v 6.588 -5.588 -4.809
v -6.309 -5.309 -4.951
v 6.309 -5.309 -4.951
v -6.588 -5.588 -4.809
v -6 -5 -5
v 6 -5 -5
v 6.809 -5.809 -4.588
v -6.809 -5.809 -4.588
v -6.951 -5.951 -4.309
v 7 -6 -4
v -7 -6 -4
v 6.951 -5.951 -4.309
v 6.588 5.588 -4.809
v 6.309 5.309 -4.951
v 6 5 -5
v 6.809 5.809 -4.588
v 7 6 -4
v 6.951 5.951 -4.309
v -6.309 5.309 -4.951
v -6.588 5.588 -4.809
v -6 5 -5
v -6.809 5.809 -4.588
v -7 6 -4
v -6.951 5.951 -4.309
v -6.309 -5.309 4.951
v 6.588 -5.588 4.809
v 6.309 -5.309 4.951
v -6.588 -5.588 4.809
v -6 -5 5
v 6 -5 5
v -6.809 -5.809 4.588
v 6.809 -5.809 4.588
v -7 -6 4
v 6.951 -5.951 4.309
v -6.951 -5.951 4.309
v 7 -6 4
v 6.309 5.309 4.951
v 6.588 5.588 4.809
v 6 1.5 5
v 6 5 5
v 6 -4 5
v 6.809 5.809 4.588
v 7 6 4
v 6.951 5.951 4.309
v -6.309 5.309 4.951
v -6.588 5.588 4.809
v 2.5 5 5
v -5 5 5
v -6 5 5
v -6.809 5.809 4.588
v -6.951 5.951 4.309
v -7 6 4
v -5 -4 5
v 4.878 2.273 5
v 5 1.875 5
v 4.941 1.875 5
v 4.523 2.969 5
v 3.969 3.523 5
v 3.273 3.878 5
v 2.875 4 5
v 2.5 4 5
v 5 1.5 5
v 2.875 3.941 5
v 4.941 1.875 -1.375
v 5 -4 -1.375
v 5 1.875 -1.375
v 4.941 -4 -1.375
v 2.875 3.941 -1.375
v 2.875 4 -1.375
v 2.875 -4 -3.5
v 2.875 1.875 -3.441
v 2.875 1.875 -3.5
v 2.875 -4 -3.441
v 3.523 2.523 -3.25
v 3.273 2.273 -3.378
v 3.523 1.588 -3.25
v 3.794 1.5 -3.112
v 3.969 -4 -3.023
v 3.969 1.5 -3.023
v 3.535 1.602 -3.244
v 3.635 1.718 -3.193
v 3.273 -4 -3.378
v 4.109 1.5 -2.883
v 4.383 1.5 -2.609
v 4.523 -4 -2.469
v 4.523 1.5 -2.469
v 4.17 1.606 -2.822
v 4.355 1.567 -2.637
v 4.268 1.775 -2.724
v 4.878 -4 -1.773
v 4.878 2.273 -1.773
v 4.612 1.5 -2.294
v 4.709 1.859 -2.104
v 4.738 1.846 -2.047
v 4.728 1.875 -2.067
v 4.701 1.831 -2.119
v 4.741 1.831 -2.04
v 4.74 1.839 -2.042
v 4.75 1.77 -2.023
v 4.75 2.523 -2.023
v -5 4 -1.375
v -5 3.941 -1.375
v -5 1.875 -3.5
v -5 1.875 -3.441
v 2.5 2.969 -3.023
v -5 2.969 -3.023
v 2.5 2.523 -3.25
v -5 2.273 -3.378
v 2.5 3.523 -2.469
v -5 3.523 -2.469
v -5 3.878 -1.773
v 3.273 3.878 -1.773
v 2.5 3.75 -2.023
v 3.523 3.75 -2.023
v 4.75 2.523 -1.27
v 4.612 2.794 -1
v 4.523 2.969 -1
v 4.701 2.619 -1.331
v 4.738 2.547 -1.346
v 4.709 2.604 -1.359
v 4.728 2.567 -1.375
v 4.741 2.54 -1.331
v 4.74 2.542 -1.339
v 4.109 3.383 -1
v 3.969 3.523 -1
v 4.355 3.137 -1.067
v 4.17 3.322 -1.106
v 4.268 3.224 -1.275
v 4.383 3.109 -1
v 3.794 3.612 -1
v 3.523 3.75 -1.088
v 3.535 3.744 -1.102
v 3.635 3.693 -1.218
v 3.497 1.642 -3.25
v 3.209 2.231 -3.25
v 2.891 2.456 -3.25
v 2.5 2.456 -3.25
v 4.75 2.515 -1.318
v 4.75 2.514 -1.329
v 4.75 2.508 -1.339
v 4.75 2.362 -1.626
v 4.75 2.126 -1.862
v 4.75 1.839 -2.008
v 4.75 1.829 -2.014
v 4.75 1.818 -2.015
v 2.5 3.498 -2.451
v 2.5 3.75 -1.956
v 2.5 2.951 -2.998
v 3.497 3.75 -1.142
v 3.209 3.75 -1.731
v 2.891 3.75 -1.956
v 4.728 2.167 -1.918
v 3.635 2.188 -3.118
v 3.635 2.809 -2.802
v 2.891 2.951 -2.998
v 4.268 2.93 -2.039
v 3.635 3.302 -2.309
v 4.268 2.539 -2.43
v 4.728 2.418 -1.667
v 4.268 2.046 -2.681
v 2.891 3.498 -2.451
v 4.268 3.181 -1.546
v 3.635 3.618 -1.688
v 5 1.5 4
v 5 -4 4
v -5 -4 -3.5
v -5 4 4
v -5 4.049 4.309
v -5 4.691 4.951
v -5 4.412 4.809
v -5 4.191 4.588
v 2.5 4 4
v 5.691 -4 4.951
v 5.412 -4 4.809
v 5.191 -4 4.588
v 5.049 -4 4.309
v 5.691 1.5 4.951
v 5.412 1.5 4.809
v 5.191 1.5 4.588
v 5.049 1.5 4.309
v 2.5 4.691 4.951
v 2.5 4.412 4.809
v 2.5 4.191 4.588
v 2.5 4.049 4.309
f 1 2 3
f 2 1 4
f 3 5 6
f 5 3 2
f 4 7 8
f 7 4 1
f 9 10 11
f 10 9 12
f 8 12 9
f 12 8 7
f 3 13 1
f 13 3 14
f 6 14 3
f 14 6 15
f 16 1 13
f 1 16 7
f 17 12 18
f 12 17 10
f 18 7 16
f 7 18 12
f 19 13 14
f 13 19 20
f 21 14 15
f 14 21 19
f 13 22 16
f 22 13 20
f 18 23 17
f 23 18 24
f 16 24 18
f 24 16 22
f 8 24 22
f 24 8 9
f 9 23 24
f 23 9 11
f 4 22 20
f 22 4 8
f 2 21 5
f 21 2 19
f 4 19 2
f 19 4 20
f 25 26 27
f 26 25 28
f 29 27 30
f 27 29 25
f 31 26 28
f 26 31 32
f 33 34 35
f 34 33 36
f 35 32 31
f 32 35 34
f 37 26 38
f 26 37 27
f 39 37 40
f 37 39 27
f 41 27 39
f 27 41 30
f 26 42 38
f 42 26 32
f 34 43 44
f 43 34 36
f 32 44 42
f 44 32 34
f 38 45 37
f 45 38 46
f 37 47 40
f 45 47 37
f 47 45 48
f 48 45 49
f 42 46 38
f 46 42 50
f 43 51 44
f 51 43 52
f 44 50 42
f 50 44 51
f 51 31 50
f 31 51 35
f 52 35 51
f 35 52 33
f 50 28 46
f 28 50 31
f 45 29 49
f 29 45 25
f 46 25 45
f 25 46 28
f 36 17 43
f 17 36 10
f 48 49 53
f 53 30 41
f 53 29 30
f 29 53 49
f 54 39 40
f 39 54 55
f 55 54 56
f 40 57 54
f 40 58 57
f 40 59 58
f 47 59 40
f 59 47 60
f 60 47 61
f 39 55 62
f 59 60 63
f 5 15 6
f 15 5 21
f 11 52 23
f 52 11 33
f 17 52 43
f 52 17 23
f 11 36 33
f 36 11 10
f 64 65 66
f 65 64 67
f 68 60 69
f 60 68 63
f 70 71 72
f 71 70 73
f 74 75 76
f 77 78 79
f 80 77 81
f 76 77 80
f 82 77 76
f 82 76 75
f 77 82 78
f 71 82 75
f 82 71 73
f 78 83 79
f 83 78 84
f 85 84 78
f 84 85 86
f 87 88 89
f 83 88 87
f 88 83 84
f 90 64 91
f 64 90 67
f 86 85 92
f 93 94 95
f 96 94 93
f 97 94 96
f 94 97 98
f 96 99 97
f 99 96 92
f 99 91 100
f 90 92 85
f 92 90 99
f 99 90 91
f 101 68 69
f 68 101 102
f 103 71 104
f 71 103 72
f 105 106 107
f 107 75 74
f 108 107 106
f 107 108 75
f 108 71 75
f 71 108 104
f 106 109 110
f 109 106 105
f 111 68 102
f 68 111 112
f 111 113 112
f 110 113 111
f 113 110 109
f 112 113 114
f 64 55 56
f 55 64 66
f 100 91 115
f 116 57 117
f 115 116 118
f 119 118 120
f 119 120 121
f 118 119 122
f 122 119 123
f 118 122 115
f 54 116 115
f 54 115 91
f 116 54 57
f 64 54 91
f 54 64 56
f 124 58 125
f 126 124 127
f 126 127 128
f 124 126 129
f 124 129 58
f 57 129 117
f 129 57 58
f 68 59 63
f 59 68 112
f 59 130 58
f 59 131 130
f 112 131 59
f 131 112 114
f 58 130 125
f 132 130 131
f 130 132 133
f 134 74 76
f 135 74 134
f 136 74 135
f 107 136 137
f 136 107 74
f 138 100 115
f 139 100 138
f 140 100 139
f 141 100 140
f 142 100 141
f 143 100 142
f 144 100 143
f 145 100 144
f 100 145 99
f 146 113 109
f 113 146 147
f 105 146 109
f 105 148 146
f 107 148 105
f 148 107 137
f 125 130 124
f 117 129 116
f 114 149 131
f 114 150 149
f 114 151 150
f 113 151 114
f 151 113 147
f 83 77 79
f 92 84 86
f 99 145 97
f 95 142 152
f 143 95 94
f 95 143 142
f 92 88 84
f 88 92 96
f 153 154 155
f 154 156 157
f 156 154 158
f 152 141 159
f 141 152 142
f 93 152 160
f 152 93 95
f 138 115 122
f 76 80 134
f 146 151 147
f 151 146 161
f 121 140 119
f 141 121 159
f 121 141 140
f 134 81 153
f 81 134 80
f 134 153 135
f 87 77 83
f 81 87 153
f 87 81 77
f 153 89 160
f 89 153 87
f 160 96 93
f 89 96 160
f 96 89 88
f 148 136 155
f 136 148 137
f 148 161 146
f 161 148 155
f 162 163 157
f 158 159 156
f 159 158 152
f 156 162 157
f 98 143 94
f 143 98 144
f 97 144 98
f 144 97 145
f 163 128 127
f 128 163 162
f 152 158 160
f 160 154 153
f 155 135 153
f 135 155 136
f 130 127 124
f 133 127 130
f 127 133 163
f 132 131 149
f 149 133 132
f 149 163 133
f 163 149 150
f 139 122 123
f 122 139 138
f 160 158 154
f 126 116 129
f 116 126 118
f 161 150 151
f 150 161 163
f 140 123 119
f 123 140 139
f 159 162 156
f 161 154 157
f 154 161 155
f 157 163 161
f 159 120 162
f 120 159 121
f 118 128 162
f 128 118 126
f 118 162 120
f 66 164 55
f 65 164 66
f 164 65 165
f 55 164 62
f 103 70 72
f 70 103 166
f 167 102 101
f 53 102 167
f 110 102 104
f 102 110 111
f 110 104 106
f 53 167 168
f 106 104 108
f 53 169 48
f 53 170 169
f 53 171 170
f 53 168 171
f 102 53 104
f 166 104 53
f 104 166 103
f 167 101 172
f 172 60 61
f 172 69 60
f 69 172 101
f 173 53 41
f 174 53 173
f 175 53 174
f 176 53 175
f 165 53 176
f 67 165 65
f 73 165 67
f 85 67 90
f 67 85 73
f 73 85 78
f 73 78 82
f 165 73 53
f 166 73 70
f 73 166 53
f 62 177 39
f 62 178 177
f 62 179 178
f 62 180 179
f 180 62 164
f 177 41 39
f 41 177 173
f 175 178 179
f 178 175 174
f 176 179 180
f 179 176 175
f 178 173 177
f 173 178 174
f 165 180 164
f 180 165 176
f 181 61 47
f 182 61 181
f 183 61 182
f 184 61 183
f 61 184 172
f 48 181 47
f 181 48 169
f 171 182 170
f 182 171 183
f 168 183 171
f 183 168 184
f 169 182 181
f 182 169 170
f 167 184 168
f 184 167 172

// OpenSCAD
$fn=20;

module rcube(size=[1,1,1], center=false, radius=1, debug=false,
		bo, ce, to,
		fr, ri, ba, le,
		bf, br, bb, bl,
		cfl, cfr, cbr, cbl,
		tf, tr, tb, tl) {
		
	// define all values
	bo = bo == undef ? true : bo;
	ce = ce == undef ? true : ce;
	to = to == undef ? true : to;
	
	fr = fr == undef ? true : fr;
	ri = ri == undef ? true : ri;
	ba = ba == undef ? true : ba;
	le = le == undef ? true : le;
	
	bf = bf == undef ? (bo && fr) : bf;
	br = br == undef ? (bo && ri) : br;
	bb = bb == undef ? (bo && ba) : bb;
	bl = bl == undef ? (bo && le) : bl;
	cfl = cfl == undef ? (ce && fr && le) : cfl;
	cfr = cfr == undef ? (ce && fr && ri) : cfr;
	cbr = cbr == undef ? (ce && ba && ri) : cbr;
	cbl = cbl == undef ? (ce && ba && le) : cbl;
	tf = tf == undef ? (to && fr) : tf;
	tr = tr == undef ? (to && ri) : tr;
	tb = tb == undef ? (to && ba) : tb;
	tl = tl == undef ? (to && le) : tl;
	
	module roundEdge(length, translation=[0,0,0], rotation=[0,0,0]) {
		translate(translation) {
			rotate(rotation) {
				difference() {
					translate([(radius)/2 + 1/4,(radius)/2 + 1/4,0]) {
						cube([radius/2 + 1, radius/2 + 1, length + 4], center=true);
					}
					cylinder(h=length + 2, r=radius, center=true);
				}
			}
		}
	}
	module roundFullCorner(translation=[0,0,0], rotation=[0,0,0]) {
		translate(translation) {
			rotate(rotation) {
				difference() {
					cube([radius/2 + 1, radius/2 + 1, radius/2 + 1]);
					sphere(r=radius);
				}
			}
		}			
	}
	
	if(debug) {
		cube(size=size, center=center);
	} else {
	
		translation = center ? [0,0,0] : size / 2;
	
		translate(translation) {
	
			difference() {
				cube(size=size, center=true);
		
				union() {
					x = size[0];
					y = size[1];
					z = size[2];
			
					// edges
					if(bf) {
						roundEdge(x,[0,-y/2 + radius,-z/2 + radius],[180,90,0]);
					}
					if(br) {
						roundEdge(y,[x/2 - radius,0,-z/2 + radius],[90,90,0]);
					}
					if(bb) {
						roundEdge(x,[0,y/2 - radius,-z/2 + radius],[0,90,0]);
					}
					if(bl) {
						roundEdge(y,[-x/2 + radius,0,-z/2 + radius],[90,180,0]);
					}
					if(cfl) {
						roundEdge(z,[-x/2 + radius,-y/2 + radius,0],[0,0,180]);
					}
					if(cfr) {
						roundEdge(z,[x/2 - radius,-y/2 + radius,0],[0,0,270]);
					}
					if(cbl) {
						roundEdge(z,[-x/2 + radius,y/2 - radius,0],[0,0,90]);
					}
					if(cbr) {
						roundEdge(z,[x/2 - radius,y/2 - radius,0],[0,0,0]);
					}
					if(bf) {
						roundEdge(x,[0,-y/2 + radius,-z/2 + radius],[180,90,0]);
					}
					if(tf) {
						roundEdge(x,[0,-y/2 + radius,z/2 - radius],[180,270,0]);
					}
					if(tr) {
						roundEdge(y,[x/2 - radius,0,z/2 - radius],[270,270,0]);
					}
					if(tb) {
						roundEdge(x,[0,y/2 - radius,z/2 - radius],[0,270,0]);
					}
					if(tl) {
						roundEdge(y,[-x/2 + radius,0,z/2 - radius],[270,180,0]);
					}

					// corners
					if(bf && bl && cfl) {
						roundFullCorner([-x/2 + radius,-y/2 + radius,-z/2 + radius], [180,90,0]);
					}
					if(bf && br && cfr) {
						roundFullCorner([x/2 - radius,-y/2 + radius,-z/2 + radius], [180,0,0]);
					}
					if(bb && br && cbr) {
						roundFullCorner([x/2 - radius,y/2 - radius,-z/2 + radius], [0,90,0]);
					}
					if(bb && bl && cbl) {
						roundFullCorner([-x/2 + radius,y/2 - radius,-z/2 + radius], [0,180,0]);
					}
					if(tf && tl && cfl) {
						roundFullCorner([-x/2 + radius,-y/2 + radius,z/2 - radius], [0,0,180]);
					}
					if(tf && tr && cfr) {
						roundFullCorner([x/2 - radius,-y/2 + radius,z/2 - radius], [0,0,270]);
					}
					if(tb && tr && cbr) {
						roundFullCorner([x/2 - radius,y/2 - radius,z/2 - radius], [0,0,0]);
					}
					if(tb && tl && cbl) {
						roundFullCorner([-x/2 + radius,y/2 - radius,z/2 - radius], [0,0,90]);
					}
				}
			}
		}
	}
}

module rInnerTopCube(size=[1,1,1], center=false, radius=1, radius1, radius2, debug=false,
		f=true, r=true, b=true, l=true, convexity=10, $fn=$fn) {

	// define radius1 and radius2
	radius1 = radius1 == undef ? radius : radius1;
	radius2 = radius2 == undef ? radius : radius2;

	module roundEdge(length, translation=[0,0,0], rotation=[0,0,0]) {
		translate(translation) {
			rotate(rotation) {
				difference() {
					translate([-1/2,0,0]) {
						cube([radius1 + 1, 2*radius1, length], center=true);
					}
					translate([radius1/2,-radius1,0]) {
						cylinder(h=length, r=radius1, center=true);
					}
				}
			}
		}
	}
	module roundCorner1(translation=[0,0,0], rotation=[0,0,0]) {
		translate(translation) {
			rotate(rotation) {
				if (radius1 > radius2) {
					difference() {
						cube([2*radius1 + 1,2*radius1 + 1,radius1 + 1]);
						union() {
							translate([0,-1,0]) {
								rotate([270,0,0]) {
									cylinder(h=2*radius1 + 3, r=radius1);
								}
							}
							translate([-1,0,0]) {
								rotate([0,90,0]) {
									cylinder(h=2*radius1 + 3, r=radius1);
								}
							}
						}
					}
				}
			}
		}
	}
	module roundCorner2(translation=[0,0,0], rotation=[0,0,0]) {
		if (radius2 > 0) {
			translate(translation) {
				rotate(rotation) {
					intersection() {
						translate([-radius1-radius2,-radius1-radius2,0]) {
							cube([radius1+radius2+1,radius1+radius2+1,radius2 + 1]);
						}
						difference() {
							translate([0,0,-1]) {
								cylinder(h=radius2 + 3, r=radius1+radius2);
							}
							rotate_extrude(convexity=convexity) {
								translate([radius1+radius2,0,0]) {
									circle(r=radius1, $fn=$fn);
								}
							}
						}
					}
				}
			}
		}
	}
	
	function pos1(pos) = pos > 0 ? pos + radius1 : pos - radius1;
	function pos2(pos) = pos > 0 ? pos - radius2 : pos + radius2;

	module roundCorner(translation=[0,0,0], rotation=[0,0,0]) {
		intersection() {
			roundCorner1([pos1(translation[0]), pos1(translation[1]), translation[2]], rotation);
			roundCorner2([pos2(translation[0]), pos2(translation[1]), translation[2]], rotation);
		}
	}

	function rFR() = (f && r == true) ? true : false;
	function rRB() = (r && b == true) ? true : false;
	function rBL() = (b && l == true) ? true : false;
	function rLF() = (l && f == true) ? true : false;
	
	function longerRadius() = radius1 > radius2 ? radius1 : radius2;
	
	function edgeLength(length, c1, c2) = (c1 == true) ? ((c2 == true) ? length - 2*longerRadius() : length - longerRadius()) : ((c2 == true) ? length - longerRadius() : length);
	
	function edgePosition(c1, c2) = (c1 == c2) ? 0 : ((c1 == true) ? 1*longerRadius()/2 : -longerRadius()/2);

	if(!debug) {
		x = size[0];
		y = size[1];
		z = size[2];
		
		union() {
			// edges
			if(f) {
				roundEdge(edgeLength(x, rFR(), rLF()),[edgePosition(rLF(), rFR()),-y/2,(z-radius1)/2],[0,90,0]);
			}
			if(r) {
				roundEdge(edgeLength(y, rFR(), rRB()),[x/2,edgePosition(rFR(), rRB()),(z-radius1)/2],[270,90,0]);
			}
			if(b) {
				roundEdge(edgeLength(x, rRB(), rBL()),[edgePosition(rBL(), rRB()),y/2,(z-radius1)/2],[180,90,0]);
			}
			if(l) {
				roundEdge(edgeLength(y, rBL(), rLF()),[-x/2,edgePosition(rLF(), rBL()),(z-radius1)/2],[90,90,0]);
			}
			// corners
			if(rFR()) {
				roundCorner([x/2,-y/2,z/2-radius1], [0,0,90]);
			}
			if(rRB()) {
				roundCorner([x/2,y/2,z/2-radius1], [0,0,180]);
			}
			if(rBL()) {
				roundCorner([-x/2,y/2,z/2-radius1], [0,0,270]);
			}
			if(rLF()) {
				roundCorner([-x/2,-y/2,z/2-radius1], [0,0,0]);
			}
		}
	}
}

debug = false;
difference() {
	rcube([14,12,10], radius=1, ce=false, center=true, debug=debug);
	union() {
		translate([0,0,1]) {
			rcube([10,8,9], radius=2.5, bo=true, to=false, fr=false, le=false, debug=debug, center=true);
		}
		rInnerTopCube([10,8,10], f=false, l=false, radius1 = 1, radius2=2.5, debug=debug, center=true);
	}
}
